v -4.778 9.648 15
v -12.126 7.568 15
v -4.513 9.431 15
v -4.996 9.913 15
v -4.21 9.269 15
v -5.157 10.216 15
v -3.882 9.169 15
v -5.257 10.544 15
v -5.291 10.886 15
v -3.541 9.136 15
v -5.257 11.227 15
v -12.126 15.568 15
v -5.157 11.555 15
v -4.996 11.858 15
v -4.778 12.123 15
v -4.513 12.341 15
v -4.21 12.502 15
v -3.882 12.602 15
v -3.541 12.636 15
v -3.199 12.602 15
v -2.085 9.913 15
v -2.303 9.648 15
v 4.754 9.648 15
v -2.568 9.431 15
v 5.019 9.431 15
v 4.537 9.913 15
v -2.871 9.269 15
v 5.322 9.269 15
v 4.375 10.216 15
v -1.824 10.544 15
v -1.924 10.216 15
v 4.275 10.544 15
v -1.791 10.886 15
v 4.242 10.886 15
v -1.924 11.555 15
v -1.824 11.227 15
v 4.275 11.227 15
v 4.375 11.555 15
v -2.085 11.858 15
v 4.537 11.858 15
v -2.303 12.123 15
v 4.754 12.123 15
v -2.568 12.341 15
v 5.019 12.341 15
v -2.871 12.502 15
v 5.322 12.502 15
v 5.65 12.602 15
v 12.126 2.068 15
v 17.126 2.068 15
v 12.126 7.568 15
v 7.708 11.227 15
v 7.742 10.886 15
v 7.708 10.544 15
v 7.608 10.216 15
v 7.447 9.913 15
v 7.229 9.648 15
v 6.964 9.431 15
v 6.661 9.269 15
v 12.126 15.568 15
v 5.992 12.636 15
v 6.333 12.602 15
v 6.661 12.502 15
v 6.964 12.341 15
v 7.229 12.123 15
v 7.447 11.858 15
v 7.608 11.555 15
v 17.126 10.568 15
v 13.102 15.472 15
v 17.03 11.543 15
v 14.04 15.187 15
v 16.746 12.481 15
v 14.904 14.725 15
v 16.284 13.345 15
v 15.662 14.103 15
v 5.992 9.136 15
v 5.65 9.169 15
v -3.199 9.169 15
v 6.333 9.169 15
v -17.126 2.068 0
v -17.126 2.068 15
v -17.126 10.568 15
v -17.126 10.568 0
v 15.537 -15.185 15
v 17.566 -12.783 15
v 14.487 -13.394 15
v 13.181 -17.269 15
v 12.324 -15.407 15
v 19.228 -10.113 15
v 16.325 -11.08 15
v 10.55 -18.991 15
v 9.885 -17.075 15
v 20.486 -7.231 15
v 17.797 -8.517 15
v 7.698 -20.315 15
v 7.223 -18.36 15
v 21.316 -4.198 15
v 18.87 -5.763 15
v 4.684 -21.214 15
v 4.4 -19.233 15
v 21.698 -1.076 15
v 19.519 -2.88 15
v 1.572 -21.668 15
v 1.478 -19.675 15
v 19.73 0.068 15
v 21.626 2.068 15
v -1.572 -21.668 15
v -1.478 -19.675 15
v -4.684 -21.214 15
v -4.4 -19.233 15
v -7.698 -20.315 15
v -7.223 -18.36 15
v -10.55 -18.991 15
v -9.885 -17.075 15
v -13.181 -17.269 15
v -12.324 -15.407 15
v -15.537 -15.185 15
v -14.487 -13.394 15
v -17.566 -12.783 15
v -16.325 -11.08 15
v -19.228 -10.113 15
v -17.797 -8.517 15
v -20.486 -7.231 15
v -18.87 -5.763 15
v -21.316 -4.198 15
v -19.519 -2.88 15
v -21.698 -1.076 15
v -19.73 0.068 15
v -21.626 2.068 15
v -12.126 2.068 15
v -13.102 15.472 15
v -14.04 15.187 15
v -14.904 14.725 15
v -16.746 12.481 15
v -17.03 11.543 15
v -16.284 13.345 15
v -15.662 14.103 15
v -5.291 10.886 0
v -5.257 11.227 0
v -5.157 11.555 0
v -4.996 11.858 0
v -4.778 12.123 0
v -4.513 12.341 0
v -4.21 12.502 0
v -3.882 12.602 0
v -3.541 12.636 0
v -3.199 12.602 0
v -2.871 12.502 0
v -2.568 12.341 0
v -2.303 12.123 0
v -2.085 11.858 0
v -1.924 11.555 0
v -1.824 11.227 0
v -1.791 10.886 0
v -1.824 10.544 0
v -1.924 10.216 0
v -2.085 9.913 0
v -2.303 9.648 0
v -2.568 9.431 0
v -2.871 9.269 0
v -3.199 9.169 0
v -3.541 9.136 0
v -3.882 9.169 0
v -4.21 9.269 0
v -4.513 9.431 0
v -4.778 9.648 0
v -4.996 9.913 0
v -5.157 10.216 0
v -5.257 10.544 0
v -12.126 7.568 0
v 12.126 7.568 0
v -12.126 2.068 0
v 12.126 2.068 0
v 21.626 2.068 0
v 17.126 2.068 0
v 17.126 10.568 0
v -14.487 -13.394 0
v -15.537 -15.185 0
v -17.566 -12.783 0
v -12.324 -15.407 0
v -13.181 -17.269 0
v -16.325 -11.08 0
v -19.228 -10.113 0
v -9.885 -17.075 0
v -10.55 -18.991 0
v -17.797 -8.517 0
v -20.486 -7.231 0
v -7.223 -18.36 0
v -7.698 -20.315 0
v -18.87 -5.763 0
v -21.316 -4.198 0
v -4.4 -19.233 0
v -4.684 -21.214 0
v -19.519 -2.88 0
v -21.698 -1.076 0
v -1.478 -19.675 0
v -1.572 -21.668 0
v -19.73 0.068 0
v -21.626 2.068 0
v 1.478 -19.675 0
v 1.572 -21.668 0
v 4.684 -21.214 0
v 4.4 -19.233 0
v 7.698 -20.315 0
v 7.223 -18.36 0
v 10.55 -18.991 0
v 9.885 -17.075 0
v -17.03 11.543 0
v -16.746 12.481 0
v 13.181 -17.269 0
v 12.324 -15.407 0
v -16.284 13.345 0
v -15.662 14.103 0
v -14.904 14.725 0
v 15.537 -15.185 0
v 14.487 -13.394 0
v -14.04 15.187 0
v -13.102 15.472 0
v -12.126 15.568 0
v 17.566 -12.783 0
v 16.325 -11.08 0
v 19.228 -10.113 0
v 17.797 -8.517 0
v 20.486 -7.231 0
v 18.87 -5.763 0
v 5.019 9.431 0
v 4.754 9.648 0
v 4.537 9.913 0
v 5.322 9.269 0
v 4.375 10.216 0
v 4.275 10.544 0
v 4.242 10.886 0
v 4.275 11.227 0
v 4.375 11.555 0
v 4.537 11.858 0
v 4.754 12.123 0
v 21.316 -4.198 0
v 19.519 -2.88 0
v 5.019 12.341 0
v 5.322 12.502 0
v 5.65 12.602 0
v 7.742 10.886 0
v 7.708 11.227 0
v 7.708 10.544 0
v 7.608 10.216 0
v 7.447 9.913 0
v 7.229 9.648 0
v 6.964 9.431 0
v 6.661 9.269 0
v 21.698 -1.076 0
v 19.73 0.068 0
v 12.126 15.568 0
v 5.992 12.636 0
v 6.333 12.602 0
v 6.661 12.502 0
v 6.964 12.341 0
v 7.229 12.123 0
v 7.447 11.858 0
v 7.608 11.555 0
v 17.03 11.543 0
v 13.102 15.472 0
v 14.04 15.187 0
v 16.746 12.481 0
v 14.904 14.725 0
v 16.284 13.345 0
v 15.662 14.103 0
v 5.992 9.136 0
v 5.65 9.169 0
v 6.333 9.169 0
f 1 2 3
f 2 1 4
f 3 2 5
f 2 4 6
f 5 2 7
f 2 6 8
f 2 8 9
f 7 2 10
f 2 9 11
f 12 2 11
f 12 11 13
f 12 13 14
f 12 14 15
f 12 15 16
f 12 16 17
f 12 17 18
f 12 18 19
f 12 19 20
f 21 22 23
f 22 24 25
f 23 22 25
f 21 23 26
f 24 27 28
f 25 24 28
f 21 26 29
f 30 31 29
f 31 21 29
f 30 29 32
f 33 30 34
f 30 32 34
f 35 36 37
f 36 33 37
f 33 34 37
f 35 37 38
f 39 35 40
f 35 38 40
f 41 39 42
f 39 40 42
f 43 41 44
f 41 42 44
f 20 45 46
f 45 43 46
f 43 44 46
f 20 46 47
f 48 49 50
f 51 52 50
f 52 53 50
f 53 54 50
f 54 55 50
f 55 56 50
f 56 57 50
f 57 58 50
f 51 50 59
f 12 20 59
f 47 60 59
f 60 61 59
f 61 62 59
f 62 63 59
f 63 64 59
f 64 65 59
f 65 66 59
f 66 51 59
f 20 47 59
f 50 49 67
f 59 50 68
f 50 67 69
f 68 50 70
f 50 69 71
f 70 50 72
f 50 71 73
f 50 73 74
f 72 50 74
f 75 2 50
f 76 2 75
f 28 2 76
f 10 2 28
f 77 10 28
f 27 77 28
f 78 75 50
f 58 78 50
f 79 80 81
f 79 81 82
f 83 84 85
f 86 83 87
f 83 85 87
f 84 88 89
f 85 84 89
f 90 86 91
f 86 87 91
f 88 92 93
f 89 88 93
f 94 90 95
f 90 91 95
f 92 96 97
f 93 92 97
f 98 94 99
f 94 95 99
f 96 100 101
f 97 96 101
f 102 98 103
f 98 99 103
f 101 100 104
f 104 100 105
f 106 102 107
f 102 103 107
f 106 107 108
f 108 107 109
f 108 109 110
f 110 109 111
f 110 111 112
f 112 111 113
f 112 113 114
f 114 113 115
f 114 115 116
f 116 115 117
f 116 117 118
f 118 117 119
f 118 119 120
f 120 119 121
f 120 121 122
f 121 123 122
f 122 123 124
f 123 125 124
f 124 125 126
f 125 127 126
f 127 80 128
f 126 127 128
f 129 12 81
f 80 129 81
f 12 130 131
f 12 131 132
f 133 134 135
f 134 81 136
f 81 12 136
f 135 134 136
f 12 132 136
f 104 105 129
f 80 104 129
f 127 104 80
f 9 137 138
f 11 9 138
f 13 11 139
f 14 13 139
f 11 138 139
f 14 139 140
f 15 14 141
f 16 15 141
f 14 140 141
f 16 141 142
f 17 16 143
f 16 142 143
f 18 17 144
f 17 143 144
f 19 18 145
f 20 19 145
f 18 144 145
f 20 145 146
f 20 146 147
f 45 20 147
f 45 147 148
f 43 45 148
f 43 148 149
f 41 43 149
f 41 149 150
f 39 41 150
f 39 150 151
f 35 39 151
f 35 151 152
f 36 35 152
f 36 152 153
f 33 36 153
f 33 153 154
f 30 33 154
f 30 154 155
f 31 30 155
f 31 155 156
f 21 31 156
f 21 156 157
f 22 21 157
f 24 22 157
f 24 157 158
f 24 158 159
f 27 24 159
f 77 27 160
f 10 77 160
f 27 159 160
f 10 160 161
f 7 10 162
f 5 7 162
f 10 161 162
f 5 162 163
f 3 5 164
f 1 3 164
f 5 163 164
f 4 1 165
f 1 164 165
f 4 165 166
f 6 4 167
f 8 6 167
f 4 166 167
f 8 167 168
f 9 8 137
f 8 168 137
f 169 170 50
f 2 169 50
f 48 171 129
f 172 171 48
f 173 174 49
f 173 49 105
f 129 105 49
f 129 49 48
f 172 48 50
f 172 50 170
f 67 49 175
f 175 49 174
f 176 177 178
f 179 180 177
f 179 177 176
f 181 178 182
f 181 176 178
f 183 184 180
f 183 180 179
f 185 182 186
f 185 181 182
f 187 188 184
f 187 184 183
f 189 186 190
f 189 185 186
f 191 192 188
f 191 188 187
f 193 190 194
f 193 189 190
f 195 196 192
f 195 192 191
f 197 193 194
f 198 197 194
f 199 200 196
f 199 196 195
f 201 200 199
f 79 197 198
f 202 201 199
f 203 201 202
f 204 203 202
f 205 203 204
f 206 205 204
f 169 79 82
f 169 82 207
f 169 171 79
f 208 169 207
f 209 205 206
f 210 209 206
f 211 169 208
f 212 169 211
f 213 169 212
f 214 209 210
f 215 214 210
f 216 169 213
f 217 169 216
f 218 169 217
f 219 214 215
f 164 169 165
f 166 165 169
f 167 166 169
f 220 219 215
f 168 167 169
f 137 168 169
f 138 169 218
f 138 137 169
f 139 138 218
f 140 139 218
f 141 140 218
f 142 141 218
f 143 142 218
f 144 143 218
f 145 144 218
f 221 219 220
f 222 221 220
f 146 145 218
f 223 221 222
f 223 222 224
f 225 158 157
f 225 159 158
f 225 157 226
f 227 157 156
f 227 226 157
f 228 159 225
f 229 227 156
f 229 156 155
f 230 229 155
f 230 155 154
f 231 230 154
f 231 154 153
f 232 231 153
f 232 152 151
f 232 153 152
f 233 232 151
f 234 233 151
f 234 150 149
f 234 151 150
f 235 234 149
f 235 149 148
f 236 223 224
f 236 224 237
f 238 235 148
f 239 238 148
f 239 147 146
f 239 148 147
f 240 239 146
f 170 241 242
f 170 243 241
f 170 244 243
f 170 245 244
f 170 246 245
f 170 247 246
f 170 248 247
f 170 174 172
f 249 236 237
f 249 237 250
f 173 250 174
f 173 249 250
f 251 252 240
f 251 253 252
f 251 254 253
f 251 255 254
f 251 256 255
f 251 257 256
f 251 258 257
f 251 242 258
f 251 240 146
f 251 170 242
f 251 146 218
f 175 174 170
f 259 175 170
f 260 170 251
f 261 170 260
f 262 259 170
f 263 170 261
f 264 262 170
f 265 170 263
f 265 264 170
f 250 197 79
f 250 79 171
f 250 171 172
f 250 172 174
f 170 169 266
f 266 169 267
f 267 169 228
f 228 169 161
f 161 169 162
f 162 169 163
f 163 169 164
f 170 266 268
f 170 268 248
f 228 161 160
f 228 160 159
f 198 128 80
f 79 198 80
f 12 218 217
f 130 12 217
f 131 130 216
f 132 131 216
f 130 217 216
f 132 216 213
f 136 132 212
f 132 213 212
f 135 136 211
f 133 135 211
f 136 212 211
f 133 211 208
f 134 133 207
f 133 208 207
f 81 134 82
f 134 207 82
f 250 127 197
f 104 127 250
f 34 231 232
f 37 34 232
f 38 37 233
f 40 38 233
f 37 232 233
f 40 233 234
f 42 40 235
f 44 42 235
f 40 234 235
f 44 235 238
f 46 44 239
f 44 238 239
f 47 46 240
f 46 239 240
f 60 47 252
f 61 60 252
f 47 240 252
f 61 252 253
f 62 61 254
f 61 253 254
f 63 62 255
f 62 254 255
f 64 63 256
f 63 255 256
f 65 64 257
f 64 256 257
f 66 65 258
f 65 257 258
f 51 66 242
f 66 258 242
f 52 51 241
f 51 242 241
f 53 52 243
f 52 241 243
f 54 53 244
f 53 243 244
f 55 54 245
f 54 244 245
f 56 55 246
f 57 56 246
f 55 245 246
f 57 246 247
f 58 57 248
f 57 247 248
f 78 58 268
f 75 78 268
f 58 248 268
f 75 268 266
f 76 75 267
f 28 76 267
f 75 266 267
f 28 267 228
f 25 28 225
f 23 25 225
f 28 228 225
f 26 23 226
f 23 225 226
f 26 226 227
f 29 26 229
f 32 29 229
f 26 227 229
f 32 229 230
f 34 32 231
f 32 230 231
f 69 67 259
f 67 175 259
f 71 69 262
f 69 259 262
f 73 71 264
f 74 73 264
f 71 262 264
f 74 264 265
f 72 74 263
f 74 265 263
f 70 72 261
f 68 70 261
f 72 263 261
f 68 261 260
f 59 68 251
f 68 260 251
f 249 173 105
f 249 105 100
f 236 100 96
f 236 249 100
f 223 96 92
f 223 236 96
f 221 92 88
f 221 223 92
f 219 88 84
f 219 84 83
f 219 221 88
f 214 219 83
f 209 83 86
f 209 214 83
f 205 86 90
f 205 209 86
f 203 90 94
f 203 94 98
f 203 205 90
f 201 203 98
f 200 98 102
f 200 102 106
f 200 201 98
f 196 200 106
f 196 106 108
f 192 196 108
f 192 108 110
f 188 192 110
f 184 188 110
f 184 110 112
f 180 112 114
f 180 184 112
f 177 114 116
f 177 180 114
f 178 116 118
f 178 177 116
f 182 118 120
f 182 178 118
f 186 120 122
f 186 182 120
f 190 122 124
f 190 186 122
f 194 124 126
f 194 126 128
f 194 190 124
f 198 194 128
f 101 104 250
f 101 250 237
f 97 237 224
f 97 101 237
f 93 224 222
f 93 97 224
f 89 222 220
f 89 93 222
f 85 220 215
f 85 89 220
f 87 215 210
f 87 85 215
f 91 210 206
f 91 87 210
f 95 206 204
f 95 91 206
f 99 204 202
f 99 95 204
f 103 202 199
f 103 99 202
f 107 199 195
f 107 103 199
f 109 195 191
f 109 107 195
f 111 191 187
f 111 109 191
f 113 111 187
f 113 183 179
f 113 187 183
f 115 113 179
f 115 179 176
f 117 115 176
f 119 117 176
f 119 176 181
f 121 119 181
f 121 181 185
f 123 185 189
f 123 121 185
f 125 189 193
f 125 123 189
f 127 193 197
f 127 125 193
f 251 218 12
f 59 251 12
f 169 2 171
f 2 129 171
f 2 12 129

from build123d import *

# Parameters (mm, degrees)
BOSS_EXTRUDE3_DEPTH      = 15
BOSS_EXTRUDE3_DEPTH_BACK = 0.0001
CUT_EXTRUDE13_DEPTH      = 35.189972945
SKETCH31_W               = 5
SKETCH31_H               = 15
BOSS_EXTRUDE4_DEPTH      = 13.5
SKETCH32_W               = 5
SKETCH32_H               = 15.0001
BOSS_EXTRUDE5_DEPTH      = 13.5
BOSS_EXTRUDE6_REACH      = 44.929
SKETCH33_W               = 15
SKETCH33_H               = 8
CUT_EXTRUDE15_REACH      = 36.353
SKETCH34_R               = 1.75
SKETCH34_4_R             = 1.75
CUT_EXTRUDE16_DEPTH      = 15
FILLET1_R                = 5
FILLET2_R                = 5


with BuildPart() as part:
    # Sketch1 → Boss-Extrude3 (new, two sides: drawn at the far end of the back side and taken through both)
    with BuildSketch(Plane.XY.offset(-BOSS_EXTRUDE3_DEPTH_BACK)):
        with BuildLine():
            Line((-21.62638976, 2.067580939), (21.62638976, 2.067580939))
            ThreePointArc((21.62638976, 2.067580939), (0, -21.725), (-21.62638976, 2.067580939))
        make_face()
        with BuildLine():
            Line((18.013033205, -2.860307191), (-18.013033205, -2.860307191))
            ThreePointArc((-18.013033205, -2.860307191), (0, -18.238714935), (18.013033205, -2.860307191))
        make_face(mode=Mode.SUBTRACT)
    extrude(amount=BOSS_EXTRUDE3_DEPTH + BOSS_EXTRUDE3_DEPTH_BACK)

    # Sketch30 → Cut-Extrude13 (cut, through all)
    with BuildSketch(Plane.XY.offset(15)):
        with BuildLine():
            Line((-19.729884258, 0.067580939), (19.729884258, 0.067580939))
            ThreePointArc((19.729884258, 0.067580939), (0, -19.73), (-19.729884258, 0.067580939))
        make_face()
    extrude(amount=-CUT_EXTRUDE13_DEPTH, mode=Mode.SUBTRACT)

    # Sketch31 → Boss-Extrude4 (add)
    with BuildSketch(Plane(origin=(0, 2.067580939, 0), x_dir=(1, 0, 0), z_dir=(0, 1, 0))):
        with Locations((14.62638976, -7.4999)):
            Rectangle(SKETCH31_W, SKETCH31_H)
    extrude(amount=BOSS_EXTRUDE4_DEPTH)

    # Sketch32 → Boss-Extrude5 (add)
    with BuildSketch(Plane(origin=(0, 2.067580939, 0), x_dir=(1, 0, 0), z_dir=(0, 1, 0))):
        with Locations((-14.62638976, -7.49995)):
            Rectangle(SKETCH32_W, SKETCH32_H)
    extrude(amount=BOSS_EXTRUDE5_DEPTH)

    # Sketch33 → Boss-Extrude6 (add, up to next)
    with BuildSketch(Plane.ZY.offset(-12.12638976), mode=Mode.PRIVATE) as boss_extrude6_sk1:
        with Locations((7.4999, 11.567580939)):
            Rectangle(SKETCH33_W, SKETCH33_H)
    boss_extrude6_tool1 = extrude(boss_extrude6_sk1.sketch, amount=BOSS_EXTRUDE6_REACH, mode=Mode.PRIVATE) - part.part
    add(boss_extrude6_tool1.solids().sort_by_distance((12.12639, 11.567581, 7.4999))[0])

    # Sketch34 → Cut-Extrude15 (cut, up to next)
    with BuildSketch(Plane(origin=(0.255092403, 0, -0.0001), x_dir=(-1, 0, 0), z_dir=(0, 0, -1)), mode=Mode.PRIVATE) as cut_extrude15_sk1:
        with Locations((3.7956, 10.885680426)):
            Circle(SKETCH34_R)
    cut_extrude15_tool1 = extrude(cut_extrude15_sk1.sketch, amount=-CUT_EXTRUDE15_REACH, mode=Mode.PRIVATE) & part.part
    add(cut_extrude15_tool1.solids().sort_by_distance((-3.540508, 10.88568, -0.0001))[0], mode=Mode.SUBTRACT)

    # Sketch34<4> → Cut-Extrude16 (cut)
    with BuildSketch(Plane(origin=(0.255092403, 0, -0.0001), x_dir=(-1, 0, 0), z_dir=(0, 0, -1))):
        with Locations((-5.736564211, 10.885680426)):
            Circle(SKETCH34_4_R)
        with Locations((3.7956, 10.885680426)):
            Circle(SKETCH34_4_R)
    extrude(amount=-CUT_EXTRUDE16_DEPTH, mode=Mode.SUBTRACT)

    # Fillet1
    fillet1_edges = [part.edges().sort_by_distance(p)[0] for p in [
        (17.12638976, 15.567580939, 7.4999),
    ]]
    fillet(fillet1_edges, radius=FILLET1_R)

    # Fillet2
    fillet2_edges = [part.edges().sort_by_distance(p)[0] for p in [
        (-17.12638976, 15.567580939, 7.49995),
    ]]
    fillet(fillet2_edges, radius=FILLET2_R)


solid = part.part
